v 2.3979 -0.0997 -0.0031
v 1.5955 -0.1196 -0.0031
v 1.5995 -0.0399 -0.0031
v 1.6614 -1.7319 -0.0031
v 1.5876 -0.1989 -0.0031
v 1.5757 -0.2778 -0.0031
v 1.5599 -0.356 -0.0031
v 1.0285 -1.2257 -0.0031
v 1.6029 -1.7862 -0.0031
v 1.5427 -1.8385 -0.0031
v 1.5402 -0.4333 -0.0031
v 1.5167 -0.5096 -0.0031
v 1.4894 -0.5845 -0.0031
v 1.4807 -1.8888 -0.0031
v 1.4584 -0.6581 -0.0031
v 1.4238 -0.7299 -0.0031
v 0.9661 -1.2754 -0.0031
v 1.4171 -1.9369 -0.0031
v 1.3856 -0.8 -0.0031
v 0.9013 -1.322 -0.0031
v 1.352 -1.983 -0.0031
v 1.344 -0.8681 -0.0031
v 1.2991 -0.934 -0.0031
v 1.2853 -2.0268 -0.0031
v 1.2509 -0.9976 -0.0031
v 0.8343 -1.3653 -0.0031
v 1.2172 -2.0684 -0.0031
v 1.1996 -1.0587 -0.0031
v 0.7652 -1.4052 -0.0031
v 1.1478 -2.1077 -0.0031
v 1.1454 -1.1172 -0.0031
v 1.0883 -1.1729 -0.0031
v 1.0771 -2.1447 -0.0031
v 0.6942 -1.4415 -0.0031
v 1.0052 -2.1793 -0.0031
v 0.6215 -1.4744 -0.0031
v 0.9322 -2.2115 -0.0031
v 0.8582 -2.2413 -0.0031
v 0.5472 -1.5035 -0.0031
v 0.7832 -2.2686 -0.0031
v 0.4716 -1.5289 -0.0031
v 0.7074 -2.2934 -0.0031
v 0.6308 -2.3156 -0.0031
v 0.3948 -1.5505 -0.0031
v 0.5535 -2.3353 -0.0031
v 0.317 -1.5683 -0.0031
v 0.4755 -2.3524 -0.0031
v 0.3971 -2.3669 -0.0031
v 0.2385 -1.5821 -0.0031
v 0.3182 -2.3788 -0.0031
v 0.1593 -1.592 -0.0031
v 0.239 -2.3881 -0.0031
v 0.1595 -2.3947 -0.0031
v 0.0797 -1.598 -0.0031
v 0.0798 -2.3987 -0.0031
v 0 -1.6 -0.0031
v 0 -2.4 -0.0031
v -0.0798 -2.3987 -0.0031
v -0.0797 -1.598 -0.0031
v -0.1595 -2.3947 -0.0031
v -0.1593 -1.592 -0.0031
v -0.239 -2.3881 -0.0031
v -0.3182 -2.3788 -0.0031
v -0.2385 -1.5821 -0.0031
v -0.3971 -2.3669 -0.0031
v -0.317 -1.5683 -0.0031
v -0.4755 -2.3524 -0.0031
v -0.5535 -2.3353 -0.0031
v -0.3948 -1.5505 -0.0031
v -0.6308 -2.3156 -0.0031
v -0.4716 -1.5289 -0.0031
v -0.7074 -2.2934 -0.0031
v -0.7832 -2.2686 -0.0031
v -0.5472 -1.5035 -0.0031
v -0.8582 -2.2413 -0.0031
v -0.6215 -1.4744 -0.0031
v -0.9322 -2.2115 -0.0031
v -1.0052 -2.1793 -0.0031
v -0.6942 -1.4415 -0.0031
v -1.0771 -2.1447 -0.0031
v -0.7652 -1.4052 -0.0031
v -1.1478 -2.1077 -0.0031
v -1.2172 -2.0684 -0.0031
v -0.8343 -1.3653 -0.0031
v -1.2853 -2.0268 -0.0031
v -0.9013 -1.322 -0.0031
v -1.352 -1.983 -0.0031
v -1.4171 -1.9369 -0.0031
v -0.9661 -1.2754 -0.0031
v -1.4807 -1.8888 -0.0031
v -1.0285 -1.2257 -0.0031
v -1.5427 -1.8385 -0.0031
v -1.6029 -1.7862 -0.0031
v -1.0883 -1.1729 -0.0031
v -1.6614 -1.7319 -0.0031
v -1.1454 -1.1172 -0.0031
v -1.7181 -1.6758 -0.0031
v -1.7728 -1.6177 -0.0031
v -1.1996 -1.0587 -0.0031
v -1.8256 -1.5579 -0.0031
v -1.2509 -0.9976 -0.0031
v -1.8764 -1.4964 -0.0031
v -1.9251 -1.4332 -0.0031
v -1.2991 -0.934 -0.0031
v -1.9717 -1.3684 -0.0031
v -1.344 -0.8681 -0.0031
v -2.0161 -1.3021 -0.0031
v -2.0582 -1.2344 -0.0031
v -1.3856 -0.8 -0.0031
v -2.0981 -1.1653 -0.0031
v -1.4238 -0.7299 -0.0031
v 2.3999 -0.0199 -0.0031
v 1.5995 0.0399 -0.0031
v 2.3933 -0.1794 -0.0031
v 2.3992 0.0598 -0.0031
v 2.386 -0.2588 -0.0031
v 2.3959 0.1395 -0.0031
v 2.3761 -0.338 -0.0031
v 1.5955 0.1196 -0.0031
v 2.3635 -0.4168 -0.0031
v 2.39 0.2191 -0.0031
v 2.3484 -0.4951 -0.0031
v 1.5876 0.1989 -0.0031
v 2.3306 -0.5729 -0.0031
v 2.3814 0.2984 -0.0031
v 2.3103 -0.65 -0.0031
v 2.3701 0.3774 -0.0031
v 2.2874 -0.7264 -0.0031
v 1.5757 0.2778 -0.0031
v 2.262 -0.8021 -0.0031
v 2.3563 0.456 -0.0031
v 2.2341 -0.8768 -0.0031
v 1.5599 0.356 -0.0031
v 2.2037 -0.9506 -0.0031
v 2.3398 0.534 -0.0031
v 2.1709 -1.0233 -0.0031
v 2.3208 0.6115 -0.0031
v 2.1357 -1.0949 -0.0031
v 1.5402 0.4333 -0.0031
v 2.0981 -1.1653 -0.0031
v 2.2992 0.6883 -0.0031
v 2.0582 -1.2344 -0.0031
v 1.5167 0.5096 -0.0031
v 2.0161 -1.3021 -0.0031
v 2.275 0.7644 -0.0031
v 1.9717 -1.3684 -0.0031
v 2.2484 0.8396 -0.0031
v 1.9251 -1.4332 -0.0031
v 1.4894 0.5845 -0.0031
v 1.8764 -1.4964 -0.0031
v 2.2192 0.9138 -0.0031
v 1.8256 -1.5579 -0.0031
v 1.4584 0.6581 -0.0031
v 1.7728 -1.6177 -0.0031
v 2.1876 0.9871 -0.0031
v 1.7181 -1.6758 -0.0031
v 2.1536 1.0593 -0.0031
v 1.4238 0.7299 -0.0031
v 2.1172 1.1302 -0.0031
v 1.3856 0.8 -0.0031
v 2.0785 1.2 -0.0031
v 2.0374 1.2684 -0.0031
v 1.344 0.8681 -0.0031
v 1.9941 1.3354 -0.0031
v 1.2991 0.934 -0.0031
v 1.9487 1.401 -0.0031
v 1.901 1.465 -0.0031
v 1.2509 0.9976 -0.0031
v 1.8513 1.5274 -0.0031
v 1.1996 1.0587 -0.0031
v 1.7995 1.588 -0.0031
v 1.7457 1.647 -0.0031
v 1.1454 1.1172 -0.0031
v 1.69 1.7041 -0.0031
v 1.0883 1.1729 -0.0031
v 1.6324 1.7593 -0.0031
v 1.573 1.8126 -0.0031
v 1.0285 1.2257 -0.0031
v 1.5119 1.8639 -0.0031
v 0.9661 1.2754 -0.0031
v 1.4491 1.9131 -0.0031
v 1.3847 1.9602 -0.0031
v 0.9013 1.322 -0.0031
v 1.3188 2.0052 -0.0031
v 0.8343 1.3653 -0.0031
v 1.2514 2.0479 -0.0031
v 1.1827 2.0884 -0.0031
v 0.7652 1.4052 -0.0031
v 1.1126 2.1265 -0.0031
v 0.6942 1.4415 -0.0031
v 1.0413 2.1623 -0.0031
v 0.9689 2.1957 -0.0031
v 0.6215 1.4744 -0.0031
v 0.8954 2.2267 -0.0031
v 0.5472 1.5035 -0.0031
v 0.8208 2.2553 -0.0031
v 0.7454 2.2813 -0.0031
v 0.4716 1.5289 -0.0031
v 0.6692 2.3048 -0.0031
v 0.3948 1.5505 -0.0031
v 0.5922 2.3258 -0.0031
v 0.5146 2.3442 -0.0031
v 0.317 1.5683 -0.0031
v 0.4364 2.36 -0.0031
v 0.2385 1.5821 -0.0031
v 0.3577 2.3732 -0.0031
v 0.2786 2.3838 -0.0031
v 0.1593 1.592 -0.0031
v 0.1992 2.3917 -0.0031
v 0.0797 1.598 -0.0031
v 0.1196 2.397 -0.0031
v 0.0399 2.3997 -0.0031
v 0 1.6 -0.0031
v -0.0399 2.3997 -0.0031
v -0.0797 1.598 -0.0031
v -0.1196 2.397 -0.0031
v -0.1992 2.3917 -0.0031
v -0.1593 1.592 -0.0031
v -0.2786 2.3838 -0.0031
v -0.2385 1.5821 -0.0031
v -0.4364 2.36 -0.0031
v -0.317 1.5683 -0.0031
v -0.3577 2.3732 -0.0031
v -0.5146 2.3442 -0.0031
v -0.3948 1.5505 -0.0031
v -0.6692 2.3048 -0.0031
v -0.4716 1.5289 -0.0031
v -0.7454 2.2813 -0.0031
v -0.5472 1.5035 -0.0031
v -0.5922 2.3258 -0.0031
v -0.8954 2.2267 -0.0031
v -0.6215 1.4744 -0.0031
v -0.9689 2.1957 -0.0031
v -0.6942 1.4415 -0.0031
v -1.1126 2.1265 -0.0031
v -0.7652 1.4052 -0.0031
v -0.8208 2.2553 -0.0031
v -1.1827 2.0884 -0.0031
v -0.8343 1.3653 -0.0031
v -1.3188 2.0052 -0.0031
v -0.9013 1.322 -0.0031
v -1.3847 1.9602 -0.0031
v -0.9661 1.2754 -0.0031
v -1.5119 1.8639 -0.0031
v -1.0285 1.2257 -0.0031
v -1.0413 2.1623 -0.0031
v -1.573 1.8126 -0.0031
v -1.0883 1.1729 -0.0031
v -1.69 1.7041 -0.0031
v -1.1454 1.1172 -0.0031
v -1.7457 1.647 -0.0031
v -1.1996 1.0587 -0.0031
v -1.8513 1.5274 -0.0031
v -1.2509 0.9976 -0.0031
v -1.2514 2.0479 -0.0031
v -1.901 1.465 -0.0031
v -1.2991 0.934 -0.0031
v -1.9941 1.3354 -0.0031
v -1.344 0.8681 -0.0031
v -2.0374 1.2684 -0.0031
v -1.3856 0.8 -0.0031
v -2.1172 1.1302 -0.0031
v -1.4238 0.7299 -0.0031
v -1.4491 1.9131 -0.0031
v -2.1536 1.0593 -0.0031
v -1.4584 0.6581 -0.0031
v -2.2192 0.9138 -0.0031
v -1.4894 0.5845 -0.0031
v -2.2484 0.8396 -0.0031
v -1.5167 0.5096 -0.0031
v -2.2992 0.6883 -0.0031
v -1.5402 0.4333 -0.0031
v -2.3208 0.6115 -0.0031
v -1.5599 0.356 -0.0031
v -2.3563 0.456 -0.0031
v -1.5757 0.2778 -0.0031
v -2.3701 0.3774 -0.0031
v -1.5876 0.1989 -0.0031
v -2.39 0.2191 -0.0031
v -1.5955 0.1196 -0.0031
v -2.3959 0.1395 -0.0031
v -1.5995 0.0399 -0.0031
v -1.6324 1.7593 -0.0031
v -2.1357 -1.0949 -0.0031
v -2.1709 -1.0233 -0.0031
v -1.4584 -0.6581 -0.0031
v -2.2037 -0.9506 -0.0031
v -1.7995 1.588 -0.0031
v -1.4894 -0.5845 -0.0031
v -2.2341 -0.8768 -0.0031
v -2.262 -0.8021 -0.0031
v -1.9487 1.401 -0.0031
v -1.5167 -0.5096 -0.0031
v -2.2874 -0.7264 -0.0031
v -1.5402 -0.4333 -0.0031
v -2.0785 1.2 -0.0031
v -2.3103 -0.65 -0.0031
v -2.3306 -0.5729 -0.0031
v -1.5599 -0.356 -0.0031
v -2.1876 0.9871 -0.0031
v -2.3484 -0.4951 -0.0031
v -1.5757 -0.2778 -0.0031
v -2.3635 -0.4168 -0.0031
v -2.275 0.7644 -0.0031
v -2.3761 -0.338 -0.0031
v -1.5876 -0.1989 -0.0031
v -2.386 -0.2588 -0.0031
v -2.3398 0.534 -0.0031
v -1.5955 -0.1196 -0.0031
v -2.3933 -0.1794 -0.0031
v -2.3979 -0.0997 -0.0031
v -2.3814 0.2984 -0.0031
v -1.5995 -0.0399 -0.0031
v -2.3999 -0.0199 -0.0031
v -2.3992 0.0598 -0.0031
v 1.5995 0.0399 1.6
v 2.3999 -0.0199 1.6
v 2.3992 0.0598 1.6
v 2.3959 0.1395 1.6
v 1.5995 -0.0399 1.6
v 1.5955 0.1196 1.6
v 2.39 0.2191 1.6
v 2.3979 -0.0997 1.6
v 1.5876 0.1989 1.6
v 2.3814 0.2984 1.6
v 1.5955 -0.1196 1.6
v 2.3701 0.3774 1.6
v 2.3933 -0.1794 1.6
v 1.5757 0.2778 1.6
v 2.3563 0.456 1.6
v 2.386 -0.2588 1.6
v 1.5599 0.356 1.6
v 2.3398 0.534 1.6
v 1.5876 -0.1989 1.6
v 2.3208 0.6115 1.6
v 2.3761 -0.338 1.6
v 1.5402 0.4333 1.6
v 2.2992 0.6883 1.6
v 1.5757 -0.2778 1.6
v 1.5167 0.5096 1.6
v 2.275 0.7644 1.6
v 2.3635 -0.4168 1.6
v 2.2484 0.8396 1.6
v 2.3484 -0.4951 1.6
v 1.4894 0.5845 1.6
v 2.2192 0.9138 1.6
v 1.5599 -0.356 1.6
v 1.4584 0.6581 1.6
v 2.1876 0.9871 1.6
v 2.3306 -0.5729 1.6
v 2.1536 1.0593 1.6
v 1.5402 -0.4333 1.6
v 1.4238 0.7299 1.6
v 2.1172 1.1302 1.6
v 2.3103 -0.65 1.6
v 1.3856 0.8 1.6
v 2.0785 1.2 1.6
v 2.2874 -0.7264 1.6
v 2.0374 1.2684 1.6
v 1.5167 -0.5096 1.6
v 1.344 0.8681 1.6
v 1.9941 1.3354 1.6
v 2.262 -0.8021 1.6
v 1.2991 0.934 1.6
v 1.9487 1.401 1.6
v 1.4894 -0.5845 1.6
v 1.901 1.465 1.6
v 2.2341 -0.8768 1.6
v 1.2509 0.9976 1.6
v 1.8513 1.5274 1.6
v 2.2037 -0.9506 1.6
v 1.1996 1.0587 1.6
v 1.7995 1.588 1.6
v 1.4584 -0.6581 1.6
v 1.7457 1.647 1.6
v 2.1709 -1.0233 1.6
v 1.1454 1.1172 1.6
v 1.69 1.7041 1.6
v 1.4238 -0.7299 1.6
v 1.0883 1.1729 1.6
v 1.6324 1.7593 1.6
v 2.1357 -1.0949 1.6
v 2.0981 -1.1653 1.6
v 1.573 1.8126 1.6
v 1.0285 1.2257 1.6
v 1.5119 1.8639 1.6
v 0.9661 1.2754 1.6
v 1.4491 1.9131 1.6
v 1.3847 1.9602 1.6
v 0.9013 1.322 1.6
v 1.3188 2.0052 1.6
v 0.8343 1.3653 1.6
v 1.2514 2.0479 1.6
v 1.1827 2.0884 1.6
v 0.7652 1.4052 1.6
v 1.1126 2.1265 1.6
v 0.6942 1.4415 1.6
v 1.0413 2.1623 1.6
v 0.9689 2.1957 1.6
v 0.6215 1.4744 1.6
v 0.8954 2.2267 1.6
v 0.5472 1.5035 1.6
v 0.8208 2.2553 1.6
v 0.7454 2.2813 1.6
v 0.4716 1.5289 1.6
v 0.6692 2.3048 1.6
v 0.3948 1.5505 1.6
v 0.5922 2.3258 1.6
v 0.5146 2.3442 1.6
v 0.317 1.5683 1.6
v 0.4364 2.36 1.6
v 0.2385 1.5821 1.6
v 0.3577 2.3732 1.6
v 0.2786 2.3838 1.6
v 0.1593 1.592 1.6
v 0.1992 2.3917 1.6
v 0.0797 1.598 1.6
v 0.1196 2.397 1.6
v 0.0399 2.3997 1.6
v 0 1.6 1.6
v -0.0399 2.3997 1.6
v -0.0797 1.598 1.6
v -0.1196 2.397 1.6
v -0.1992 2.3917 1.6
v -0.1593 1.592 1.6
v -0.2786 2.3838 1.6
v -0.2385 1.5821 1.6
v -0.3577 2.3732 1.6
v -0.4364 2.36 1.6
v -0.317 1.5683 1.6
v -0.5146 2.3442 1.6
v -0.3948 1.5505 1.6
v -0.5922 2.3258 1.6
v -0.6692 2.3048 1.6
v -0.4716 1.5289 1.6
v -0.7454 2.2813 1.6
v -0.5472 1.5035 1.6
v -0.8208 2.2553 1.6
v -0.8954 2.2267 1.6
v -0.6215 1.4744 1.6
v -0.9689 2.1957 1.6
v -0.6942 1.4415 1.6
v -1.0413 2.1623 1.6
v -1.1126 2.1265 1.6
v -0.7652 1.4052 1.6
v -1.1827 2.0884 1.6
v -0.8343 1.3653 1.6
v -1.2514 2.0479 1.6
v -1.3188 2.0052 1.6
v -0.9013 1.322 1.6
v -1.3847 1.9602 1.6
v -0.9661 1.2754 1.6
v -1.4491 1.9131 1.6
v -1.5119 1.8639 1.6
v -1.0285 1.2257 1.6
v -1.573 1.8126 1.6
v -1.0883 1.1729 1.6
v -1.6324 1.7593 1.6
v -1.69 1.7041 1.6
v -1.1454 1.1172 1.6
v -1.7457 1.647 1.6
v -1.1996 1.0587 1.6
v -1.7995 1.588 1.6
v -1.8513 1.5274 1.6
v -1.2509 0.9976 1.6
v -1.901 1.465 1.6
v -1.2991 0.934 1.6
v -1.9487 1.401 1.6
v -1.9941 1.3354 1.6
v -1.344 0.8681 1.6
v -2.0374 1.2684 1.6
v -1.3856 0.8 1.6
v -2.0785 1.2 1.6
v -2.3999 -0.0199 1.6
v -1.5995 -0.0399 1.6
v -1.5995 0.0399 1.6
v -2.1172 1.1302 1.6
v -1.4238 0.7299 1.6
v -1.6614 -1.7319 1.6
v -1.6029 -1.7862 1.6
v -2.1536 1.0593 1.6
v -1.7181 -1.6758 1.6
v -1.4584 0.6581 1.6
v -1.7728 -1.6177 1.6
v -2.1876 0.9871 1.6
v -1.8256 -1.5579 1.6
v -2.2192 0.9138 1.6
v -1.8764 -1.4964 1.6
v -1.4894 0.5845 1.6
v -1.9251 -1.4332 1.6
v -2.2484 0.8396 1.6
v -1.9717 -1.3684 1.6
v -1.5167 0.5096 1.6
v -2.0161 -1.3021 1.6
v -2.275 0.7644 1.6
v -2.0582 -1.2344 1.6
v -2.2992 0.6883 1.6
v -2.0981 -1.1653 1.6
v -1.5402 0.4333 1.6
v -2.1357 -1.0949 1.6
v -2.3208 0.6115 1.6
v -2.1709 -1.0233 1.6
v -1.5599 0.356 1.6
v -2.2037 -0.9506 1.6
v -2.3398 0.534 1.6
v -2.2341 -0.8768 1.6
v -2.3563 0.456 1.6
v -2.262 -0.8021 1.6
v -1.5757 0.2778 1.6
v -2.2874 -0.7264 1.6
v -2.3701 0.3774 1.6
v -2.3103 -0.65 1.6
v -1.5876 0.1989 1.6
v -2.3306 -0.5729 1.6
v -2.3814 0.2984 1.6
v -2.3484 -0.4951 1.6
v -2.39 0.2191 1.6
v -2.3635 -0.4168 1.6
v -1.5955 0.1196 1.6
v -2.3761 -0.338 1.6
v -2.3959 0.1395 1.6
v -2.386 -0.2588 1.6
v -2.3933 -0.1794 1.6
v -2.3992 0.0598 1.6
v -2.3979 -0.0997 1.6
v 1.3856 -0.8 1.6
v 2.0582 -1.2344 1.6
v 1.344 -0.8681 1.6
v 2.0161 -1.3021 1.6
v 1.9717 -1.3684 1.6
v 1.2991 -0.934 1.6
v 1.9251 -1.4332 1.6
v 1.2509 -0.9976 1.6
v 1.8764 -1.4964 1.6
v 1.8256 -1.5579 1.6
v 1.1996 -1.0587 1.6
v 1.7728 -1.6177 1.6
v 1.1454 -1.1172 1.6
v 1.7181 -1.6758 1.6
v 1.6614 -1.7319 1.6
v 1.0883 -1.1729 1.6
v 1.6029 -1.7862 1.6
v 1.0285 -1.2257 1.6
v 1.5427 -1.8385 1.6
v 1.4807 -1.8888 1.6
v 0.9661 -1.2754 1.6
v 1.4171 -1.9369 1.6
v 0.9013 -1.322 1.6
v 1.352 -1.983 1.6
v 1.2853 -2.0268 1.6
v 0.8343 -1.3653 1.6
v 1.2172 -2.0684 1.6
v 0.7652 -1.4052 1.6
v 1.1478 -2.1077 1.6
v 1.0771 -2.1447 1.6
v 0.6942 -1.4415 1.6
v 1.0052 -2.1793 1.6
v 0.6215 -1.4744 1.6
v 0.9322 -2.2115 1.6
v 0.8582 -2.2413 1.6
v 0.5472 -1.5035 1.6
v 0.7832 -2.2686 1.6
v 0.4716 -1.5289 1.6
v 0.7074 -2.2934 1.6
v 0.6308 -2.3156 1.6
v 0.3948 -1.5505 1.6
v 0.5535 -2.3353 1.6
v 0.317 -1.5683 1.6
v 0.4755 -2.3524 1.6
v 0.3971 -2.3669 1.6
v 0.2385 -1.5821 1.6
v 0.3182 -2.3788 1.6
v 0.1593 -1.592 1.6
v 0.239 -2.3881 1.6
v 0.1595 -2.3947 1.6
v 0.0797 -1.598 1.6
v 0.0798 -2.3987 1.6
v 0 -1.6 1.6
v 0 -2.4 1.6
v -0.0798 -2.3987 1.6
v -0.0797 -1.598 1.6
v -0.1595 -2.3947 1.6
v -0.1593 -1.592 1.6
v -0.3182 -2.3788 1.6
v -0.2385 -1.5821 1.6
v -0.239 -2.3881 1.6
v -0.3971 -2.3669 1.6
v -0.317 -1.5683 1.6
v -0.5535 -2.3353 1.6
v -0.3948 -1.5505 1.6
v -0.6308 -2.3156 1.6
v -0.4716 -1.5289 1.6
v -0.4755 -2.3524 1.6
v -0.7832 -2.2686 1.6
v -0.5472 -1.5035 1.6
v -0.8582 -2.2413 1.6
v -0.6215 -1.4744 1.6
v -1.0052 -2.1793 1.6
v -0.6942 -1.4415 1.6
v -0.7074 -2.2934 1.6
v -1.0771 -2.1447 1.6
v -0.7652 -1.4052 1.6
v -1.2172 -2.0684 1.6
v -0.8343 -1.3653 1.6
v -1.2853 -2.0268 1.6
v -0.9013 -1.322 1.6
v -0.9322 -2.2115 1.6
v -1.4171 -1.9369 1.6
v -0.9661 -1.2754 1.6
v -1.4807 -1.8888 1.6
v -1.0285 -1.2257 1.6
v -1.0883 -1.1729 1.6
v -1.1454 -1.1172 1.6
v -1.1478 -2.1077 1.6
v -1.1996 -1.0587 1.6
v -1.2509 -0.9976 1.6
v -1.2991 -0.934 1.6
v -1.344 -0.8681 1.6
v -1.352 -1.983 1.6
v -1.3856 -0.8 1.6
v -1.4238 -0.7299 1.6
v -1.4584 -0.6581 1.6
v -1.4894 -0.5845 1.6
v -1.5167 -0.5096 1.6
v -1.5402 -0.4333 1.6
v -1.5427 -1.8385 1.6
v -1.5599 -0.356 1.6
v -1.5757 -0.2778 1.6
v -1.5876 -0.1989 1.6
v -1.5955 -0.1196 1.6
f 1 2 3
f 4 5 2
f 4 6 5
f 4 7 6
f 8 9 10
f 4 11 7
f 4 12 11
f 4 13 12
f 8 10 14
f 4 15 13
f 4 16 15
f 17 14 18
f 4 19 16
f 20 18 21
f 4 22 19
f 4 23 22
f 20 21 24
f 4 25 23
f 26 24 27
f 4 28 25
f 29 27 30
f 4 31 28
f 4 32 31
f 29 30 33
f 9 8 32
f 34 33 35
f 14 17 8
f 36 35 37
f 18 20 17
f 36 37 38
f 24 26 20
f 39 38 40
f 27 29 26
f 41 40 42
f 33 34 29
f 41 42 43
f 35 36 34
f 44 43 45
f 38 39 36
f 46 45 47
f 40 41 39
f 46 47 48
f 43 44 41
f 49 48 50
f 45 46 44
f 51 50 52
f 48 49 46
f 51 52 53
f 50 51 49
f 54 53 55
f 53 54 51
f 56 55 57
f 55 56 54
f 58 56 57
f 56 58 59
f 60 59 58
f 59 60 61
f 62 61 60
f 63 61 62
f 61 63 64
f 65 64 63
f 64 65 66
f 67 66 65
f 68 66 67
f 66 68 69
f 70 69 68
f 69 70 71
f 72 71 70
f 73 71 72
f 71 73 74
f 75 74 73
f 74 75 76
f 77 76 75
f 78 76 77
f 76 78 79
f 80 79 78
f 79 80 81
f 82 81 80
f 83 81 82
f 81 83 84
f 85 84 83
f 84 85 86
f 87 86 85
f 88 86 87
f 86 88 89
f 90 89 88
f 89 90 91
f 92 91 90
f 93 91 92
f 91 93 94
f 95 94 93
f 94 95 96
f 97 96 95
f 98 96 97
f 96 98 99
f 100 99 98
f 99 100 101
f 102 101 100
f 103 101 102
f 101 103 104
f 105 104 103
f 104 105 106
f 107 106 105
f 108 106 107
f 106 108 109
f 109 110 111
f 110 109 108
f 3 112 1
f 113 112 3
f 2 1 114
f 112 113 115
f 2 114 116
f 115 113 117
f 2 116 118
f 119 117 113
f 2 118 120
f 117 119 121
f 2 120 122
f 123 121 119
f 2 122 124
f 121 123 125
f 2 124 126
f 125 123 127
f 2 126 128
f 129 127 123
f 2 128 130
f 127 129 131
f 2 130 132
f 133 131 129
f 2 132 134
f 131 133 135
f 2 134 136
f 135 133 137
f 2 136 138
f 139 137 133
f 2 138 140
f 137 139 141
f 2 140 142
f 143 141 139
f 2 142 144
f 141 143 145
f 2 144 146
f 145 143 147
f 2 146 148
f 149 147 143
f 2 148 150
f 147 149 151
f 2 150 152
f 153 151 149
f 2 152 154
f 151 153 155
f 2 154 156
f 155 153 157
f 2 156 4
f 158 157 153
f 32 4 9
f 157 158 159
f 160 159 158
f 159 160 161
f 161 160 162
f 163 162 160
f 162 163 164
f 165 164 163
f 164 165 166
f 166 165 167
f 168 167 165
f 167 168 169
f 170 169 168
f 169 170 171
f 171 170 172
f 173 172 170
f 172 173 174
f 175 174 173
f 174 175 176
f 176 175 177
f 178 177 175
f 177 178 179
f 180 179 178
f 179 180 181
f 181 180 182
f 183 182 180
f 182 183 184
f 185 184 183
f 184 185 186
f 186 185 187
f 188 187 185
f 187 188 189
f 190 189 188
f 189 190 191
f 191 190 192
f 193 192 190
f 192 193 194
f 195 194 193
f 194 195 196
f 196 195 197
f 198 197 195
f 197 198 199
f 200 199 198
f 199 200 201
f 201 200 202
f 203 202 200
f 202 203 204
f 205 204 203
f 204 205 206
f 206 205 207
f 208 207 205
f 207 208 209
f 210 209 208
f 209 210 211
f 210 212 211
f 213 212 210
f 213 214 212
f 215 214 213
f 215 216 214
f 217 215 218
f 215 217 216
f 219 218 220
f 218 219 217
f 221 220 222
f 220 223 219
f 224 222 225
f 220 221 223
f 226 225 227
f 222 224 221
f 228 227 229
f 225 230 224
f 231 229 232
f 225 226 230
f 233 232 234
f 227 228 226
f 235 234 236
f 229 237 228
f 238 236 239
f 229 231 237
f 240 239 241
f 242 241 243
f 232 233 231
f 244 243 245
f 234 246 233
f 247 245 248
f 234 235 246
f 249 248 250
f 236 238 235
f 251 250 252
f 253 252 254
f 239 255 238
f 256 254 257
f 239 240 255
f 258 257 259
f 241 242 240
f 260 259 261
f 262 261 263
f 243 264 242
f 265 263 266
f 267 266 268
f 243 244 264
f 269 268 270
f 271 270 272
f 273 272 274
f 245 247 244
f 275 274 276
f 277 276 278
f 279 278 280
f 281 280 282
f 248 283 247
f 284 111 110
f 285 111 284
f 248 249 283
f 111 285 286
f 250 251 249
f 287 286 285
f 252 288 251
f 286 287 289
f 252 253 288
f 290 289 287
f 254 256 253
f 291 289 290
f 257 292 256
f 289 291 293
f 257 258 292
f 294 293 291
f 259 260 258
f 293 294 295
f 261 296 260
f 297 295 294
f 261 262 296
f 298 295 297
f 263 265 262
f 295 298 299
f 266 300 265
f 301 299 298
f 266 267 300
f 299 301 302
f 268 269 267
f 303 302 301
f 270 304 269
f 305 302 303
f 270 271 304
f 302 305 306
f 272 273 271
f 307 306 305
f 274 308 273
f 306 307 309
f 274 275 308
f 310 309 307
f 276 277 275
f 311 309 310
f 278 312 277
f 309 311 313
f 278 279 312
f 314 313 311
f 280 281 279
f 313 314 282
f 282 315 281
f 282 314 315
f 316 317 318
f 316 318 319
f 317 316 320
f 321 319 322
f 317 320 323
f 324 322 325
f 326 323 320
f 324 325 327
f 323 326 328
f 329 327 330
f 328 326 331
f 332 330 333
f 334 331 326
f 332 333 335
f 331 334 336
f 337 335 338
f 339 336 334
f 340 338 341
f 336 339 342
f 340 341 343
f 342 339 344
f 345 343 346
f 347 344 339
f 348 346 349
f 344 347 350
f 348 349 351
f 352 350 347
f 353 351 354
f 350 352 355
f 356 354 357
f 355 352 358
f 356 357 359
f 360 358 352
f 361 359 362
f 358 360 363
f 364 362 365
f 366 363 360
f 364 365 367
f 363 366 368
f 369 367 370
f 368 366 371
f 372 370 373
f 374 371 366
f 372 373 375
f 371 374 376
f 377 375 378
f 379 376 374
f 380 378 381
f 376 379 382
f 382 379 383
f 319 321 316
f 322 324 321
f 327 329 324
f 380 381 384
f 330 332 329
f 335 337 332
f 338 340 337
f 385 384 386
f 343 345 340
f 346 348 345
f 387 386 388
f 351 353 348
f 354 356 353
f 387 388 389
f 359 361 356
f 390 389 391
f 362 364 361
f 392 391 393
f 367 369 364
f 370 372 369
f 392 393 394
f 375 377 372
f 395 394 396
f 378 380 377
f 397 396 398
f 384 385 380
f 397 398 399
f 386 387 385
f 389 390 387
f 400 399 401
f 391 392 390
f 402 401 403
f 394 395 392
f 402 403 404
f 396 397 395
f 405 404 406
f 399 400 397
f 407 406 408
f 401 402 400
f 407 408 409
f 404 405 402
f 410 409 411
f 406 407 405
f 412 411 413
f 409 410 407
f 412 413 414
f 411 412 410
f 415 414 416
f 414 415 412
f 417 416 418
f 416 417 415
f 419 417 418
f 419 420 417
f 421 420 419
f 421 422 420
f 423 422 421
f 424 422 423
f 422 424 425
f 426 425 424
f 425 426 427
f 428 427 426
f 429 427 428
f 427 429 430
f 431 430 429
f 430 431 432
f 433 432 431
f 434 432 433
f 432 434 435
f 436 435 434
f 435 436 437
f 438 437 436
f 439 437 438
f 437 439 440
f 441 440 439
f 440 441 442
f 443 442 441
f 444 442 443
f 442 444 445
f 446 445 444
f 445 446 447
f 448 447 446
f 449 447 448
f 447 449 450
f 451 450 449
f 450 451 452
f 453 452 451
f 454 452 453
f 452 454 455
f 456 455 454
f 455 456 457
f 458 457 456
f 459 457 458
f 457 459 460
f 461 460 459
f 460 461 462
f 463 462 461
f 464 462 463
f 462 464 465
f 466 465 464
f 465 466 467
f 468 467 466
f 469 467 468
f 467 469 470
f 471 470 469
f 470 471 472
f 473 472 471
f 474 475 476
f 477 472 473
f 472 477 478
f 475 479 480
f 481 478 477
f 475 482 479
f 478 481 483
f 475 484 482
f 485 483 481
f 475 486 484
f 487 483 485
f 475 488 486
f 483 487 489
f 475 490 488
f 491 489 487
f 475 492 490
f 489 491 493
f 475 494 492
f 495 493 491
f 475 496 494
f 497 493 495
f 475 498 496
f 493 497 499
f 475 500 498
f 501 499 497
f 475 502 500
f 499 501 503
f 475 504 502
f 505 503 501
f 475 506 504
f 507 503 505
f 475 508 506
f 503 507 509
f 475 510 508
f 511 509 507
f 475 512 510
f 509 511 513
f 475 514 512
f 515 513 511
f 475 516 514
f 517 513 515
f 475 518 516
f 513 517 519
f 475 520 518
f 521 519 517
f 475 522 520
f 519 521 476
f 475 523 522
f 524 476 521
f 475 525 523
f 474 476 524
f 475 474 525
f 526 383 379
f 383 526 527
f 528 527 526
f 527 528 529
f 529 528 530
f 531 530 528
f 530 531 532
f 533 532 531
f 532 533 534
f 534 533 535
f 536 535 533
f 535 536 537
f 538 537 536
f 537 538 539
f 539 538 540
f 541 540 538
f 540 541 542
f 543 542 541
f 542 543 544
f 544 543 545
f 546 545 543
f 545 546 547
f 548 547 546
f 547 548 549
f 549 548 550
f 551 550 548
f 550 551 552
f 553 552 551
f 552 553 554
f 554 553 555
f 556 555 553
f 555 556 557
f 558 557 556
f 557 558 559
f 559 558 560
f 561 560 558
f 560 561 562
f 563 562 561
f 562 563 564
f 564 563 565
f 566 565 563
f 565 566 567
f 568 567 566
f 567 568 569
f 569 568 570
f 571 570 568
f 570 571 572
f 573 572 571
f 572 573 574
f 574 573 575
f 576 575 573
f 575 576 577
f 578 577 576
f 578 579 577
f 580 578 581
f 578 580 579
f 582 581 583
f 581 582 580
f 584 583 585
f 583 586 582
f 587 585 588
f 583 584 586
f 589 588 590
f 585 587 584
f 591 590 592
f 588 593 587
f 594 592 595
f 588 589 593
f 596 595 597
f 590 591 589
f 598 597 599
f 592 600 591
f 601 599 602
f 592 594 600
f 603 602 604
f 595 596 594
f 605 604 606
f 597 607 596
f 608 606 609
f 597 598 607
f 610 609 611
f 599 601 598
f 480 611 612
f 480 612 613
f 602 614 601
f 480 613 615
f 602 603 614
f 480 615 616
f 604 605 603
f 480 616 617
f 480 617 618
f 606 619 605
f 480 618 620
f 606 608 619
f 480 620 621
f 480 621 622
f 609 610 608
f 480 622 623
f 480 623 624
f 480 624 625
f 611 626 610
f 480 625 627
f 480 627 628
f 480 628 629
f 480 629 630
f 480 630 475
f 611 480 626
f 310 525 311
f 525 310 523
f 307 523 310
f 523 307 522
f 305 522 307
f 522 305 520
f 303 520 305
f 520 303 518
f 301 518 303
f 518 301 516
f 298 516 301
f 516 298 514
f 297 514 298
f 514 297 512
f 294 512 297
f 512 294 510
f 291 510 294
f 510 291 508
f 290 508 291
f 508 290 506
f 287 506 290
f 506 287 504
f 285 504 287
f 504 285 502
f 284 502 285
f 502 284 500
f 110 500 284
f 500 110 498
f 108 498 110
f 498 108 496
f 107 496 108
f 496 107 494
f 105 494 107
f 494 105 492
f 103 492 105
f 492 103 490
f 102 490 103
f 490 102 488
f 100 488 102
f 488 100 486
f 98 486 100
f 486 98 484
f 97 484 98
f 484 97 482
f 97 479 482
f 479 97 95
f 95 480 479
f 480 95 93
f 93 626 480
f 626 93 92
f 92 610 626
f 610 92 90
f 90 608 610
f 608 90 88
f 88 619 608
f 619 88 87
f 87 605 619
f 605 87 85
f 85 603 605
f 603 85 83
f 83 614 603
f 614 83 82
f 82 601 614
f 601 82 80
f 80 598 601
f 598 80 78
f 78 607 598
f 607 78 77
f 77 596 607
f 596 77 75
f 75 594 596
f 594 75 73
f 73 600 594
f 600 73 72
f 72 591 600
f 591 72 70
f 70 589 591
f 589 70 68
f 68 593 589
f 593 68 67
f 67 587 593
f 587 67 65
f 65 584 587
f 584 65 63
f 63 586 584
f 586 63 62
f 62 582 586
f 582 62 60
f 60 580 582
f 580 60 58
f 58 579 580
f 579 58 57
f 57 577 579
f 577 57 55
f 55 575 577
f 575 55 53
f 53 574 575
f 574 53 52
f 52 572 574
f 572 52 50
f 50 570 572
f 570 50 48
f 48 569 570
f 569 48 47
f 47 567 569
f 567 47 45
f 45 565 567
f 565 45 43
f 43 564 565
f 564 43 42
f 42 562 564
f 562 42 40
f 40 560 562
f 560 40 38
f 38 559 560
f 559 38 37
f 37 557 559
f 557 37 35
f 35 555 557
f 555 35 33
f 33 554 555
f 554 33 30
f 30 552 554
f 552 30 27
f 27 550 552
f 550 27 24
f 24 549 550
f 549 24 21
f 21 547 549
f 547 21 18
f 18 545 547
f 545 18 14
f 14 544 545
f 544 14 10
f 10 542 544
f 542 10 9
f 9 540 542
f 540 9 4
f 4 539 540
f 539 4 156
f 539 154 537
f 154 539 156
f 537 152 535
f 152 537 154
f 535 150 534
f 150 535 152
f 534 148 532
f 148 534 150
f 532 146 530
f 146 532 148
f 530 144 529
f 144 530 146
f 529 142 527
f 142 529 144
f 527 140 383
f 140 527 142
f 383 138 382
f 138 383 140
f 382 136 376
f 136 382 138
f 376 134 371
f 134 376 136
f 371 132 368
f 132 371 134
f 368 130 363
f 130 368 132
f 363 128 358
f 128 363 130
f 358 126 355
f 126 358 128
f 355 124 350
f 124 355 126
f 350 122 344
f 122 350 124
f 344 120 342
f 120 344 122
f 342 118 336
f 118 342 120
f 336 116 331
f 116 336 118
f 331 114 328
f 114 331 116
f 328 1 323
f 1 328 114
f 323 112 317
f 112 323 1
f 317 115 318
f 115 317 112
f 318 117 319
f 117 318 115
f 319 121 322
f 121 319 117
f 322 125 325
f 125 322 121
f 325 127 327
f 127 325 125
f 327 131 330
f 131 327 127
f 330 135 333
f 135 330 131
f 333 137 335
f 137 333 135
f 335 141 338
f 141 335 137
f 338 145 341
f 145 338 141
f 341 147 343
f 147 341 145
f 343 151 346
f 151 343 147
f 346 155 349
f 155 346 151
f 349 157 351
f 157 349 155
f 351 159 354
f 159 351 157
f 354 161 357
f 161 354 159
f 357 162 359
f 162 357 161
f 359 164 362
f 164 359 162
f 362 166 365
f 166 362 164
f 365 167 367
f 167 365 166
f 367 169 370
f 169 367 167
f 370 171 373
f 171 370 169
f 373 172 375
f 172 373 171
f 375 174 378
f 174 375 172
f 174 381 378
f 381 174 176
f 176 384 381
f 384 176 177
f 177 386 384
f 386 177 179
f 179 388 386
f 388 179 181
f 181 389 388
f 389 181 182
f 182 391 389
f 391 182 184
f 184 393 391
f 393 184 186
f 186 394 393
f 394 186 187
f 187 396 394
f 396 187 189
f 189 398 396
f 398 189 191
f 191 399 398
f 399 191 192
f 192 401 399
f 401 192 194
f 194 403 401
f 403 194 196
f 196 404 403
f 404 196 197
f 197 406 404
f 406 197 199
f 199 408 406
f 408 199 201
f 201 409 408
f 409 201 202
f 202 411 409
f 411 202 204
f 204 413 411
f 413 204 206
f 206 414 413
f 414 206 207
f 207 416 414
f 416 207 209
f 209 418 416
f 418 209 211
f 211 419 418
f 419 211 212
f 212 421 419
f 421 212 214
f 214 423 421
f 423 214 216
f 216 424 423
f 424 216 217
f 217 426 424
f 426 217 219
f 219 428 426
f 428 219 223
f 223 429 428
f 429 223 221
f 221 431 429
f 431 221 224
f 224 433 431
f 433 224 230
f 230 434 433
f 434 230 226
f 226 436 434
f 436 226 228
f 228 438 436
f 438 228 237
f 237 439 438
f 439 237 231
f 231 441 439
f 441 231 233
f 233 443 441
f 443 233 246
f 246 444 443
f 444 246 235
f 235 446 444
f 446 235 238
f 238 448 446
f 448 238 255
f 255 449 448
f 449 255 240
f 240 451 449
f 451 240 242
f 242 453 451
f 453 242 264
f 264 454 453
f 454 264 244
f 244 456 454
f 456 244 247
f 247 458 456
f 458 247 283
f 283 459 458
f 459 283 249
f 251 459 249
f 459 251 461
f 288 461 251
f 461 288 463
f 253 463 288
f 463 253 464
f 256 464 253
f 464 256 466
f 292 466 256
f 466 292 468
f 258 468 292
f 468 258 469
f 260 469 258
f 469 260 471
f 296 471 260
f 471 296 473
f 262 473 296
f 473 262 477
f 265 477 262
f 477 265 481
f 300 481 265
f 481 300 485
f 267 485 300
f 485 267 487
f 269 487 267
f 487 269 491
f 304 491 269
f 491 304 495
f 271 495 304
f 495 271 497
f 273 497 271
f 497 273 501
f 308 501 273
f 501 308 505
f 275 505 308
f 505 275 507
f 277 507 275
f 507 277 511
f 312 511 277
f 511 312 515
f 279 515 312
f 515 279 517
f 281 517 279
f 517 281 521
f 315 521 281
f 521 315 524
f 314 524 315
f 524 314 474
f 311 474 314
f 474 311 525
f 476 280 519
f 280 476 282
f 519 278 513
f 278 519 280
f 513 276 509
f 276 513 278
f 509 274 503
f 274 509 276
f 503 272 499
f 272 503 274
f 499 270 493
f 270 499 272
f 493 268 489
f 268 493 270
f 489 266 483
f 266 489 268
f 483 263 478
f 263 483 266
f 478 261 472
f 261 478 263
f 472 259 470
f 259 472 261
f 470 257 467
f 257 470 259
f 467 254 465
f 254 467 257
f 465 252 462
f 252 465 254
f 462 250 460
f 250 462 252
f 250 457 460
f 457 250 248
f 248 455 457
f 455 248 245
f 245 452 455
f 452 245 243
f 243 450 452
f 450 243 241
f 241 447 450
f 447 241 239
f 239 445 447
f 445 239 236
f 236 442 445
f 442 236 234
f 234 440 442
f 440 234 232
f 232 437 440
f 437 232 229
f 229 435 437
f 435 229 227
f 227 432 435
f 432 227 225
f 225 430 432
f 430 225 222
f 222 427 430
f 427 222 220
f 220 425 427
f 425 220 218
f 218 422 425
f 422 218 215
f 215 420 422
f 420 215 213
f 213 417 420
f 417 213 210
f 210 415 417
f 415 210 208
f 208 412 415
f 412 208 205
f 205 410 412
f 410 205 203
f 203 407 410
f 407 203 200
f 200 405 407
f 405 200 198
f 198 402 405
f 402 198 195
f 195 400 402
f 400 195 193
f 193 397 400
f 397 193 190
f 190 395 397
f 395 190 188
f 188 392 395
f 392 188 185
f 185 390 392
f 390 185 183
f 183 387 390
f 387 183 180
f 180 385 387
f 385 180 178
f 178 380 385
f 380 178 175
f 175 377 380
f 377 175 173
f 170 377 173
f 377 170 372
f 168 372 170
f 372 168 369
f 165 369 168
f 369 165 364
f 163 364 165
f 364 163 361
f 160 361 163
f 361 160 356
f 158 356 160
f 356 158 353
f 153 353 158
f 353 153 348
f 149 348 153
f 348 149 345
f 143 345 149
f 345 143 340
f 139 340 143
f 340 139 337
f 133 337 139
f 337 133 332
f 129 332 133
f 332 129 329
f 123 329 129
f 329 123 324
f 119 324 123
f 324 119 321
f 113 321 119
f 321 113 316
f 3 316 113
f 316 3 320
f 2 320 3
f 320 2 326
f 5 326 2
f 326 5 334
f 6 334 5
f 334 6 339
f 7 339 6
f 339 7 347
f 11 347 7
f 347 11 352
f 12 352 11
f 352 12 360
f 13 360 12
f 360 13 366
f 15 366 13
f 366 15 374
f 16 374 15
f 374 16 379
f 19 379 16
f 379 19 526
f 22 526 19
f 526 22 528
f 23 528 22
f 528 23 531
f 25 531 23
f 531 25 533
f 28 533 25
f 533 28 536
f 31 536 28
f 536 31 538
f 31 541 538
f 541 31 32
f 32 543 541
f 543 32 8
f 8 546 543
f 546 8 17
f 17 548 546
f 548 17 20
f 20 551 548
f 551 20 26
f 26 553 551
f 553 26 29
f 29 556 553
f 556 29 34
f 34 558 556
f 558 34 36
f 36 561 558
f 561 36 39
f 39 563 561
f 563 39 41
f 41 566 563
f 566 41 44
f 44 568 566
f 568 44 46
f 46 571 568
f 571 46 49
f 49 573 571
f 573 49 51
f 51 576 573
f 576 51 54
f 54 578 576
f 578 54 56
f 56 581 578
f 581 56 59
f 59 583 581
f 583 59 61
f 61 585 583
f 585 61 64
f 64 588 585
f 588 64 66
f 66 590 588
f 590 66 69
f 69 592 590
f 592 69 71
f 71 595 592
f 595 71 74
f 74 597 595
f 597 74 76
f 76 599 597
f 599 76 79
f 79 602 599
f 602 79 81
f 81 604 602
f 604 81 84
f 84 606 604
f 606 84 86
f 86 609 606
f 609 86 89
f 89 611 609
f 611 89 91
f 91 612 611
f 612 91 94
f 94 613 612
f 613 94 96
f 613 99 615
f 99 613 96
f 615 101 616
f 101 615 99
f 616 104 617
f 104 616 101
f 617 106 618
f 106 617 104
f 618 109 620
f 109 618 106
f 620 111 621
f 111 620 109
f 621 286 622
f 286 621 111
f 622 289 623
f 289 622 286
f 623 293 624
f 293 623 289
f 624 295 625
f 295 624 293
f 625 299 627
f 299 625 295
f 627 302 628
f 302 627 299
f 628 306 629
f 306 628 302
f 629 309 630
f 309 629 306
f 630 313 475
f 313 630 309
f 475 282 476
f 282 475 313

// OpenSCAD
use <../lib.scad>
use <s/4460s01.scad>
use <../p/stud2.scad>
$fa=1; $fs=0.2;
function ldraw_lib__4460b(realsolid=false) = [
// 0 Slope Brick 75  2 x  1 x  3 with Hollow Stud
// 0 Name: 4460b.dat
// 0 Author: Max Martin Richter [MMR1988]
// 0 !LDRAW_ORG Part UPDATE 2013-02
// 0 !LICENSE Licensed under CC BY 2.0 and CC BY 4.0 : see CAreadme.txt
// 
// 0 BFC CERTIFY CCW
  [0,"BFC","CERTIFY"],
  [0,"BFC","CCW"],
// 
// 0 !HISTORY 2013-12-23 [PTadmin] Official Update 2013-02
// 
// 
// 1 16 0 0 0 1 0 0 0 1 0 0 0 1 s\4460s01.dat
  [1,16,0,0,0,1,0,0,0,1,0,0,0,1, ldraw_lib__s__4460s01(realsolid)],
// 
// 1 16 0 0 0 1 0 0 0 1 0 0 0 1 stud2.dat
  [1,16,0,0,0,1,0,0,0,1,0,0,0,1, ldraw_lib__stud2(realsolid)],
// 4 16 -6 4 -8 -6 4 6 6 4 6 6 4 -8
  [4,16,-6,4,-8,-6,4,6,6,4,6,6,4,-8],
// 4 16 10 0 10 -10 0 10 -10 0 -10 10 0 -10
  [4,16,10,0,10,-10,0,10,-10,0,-10,10,0,-10],
];
module ldraw_lib__4460b(step=0, col=false, unit=2/5, alt=false, line=0.2, solid=!$preview)
    makepoly(ldraw_lib__4460b(solid), step=step, col=col, unit=unit, alt=alt, line=line, solid=solid);
ldraw_lib__4460b(line=0.2);
